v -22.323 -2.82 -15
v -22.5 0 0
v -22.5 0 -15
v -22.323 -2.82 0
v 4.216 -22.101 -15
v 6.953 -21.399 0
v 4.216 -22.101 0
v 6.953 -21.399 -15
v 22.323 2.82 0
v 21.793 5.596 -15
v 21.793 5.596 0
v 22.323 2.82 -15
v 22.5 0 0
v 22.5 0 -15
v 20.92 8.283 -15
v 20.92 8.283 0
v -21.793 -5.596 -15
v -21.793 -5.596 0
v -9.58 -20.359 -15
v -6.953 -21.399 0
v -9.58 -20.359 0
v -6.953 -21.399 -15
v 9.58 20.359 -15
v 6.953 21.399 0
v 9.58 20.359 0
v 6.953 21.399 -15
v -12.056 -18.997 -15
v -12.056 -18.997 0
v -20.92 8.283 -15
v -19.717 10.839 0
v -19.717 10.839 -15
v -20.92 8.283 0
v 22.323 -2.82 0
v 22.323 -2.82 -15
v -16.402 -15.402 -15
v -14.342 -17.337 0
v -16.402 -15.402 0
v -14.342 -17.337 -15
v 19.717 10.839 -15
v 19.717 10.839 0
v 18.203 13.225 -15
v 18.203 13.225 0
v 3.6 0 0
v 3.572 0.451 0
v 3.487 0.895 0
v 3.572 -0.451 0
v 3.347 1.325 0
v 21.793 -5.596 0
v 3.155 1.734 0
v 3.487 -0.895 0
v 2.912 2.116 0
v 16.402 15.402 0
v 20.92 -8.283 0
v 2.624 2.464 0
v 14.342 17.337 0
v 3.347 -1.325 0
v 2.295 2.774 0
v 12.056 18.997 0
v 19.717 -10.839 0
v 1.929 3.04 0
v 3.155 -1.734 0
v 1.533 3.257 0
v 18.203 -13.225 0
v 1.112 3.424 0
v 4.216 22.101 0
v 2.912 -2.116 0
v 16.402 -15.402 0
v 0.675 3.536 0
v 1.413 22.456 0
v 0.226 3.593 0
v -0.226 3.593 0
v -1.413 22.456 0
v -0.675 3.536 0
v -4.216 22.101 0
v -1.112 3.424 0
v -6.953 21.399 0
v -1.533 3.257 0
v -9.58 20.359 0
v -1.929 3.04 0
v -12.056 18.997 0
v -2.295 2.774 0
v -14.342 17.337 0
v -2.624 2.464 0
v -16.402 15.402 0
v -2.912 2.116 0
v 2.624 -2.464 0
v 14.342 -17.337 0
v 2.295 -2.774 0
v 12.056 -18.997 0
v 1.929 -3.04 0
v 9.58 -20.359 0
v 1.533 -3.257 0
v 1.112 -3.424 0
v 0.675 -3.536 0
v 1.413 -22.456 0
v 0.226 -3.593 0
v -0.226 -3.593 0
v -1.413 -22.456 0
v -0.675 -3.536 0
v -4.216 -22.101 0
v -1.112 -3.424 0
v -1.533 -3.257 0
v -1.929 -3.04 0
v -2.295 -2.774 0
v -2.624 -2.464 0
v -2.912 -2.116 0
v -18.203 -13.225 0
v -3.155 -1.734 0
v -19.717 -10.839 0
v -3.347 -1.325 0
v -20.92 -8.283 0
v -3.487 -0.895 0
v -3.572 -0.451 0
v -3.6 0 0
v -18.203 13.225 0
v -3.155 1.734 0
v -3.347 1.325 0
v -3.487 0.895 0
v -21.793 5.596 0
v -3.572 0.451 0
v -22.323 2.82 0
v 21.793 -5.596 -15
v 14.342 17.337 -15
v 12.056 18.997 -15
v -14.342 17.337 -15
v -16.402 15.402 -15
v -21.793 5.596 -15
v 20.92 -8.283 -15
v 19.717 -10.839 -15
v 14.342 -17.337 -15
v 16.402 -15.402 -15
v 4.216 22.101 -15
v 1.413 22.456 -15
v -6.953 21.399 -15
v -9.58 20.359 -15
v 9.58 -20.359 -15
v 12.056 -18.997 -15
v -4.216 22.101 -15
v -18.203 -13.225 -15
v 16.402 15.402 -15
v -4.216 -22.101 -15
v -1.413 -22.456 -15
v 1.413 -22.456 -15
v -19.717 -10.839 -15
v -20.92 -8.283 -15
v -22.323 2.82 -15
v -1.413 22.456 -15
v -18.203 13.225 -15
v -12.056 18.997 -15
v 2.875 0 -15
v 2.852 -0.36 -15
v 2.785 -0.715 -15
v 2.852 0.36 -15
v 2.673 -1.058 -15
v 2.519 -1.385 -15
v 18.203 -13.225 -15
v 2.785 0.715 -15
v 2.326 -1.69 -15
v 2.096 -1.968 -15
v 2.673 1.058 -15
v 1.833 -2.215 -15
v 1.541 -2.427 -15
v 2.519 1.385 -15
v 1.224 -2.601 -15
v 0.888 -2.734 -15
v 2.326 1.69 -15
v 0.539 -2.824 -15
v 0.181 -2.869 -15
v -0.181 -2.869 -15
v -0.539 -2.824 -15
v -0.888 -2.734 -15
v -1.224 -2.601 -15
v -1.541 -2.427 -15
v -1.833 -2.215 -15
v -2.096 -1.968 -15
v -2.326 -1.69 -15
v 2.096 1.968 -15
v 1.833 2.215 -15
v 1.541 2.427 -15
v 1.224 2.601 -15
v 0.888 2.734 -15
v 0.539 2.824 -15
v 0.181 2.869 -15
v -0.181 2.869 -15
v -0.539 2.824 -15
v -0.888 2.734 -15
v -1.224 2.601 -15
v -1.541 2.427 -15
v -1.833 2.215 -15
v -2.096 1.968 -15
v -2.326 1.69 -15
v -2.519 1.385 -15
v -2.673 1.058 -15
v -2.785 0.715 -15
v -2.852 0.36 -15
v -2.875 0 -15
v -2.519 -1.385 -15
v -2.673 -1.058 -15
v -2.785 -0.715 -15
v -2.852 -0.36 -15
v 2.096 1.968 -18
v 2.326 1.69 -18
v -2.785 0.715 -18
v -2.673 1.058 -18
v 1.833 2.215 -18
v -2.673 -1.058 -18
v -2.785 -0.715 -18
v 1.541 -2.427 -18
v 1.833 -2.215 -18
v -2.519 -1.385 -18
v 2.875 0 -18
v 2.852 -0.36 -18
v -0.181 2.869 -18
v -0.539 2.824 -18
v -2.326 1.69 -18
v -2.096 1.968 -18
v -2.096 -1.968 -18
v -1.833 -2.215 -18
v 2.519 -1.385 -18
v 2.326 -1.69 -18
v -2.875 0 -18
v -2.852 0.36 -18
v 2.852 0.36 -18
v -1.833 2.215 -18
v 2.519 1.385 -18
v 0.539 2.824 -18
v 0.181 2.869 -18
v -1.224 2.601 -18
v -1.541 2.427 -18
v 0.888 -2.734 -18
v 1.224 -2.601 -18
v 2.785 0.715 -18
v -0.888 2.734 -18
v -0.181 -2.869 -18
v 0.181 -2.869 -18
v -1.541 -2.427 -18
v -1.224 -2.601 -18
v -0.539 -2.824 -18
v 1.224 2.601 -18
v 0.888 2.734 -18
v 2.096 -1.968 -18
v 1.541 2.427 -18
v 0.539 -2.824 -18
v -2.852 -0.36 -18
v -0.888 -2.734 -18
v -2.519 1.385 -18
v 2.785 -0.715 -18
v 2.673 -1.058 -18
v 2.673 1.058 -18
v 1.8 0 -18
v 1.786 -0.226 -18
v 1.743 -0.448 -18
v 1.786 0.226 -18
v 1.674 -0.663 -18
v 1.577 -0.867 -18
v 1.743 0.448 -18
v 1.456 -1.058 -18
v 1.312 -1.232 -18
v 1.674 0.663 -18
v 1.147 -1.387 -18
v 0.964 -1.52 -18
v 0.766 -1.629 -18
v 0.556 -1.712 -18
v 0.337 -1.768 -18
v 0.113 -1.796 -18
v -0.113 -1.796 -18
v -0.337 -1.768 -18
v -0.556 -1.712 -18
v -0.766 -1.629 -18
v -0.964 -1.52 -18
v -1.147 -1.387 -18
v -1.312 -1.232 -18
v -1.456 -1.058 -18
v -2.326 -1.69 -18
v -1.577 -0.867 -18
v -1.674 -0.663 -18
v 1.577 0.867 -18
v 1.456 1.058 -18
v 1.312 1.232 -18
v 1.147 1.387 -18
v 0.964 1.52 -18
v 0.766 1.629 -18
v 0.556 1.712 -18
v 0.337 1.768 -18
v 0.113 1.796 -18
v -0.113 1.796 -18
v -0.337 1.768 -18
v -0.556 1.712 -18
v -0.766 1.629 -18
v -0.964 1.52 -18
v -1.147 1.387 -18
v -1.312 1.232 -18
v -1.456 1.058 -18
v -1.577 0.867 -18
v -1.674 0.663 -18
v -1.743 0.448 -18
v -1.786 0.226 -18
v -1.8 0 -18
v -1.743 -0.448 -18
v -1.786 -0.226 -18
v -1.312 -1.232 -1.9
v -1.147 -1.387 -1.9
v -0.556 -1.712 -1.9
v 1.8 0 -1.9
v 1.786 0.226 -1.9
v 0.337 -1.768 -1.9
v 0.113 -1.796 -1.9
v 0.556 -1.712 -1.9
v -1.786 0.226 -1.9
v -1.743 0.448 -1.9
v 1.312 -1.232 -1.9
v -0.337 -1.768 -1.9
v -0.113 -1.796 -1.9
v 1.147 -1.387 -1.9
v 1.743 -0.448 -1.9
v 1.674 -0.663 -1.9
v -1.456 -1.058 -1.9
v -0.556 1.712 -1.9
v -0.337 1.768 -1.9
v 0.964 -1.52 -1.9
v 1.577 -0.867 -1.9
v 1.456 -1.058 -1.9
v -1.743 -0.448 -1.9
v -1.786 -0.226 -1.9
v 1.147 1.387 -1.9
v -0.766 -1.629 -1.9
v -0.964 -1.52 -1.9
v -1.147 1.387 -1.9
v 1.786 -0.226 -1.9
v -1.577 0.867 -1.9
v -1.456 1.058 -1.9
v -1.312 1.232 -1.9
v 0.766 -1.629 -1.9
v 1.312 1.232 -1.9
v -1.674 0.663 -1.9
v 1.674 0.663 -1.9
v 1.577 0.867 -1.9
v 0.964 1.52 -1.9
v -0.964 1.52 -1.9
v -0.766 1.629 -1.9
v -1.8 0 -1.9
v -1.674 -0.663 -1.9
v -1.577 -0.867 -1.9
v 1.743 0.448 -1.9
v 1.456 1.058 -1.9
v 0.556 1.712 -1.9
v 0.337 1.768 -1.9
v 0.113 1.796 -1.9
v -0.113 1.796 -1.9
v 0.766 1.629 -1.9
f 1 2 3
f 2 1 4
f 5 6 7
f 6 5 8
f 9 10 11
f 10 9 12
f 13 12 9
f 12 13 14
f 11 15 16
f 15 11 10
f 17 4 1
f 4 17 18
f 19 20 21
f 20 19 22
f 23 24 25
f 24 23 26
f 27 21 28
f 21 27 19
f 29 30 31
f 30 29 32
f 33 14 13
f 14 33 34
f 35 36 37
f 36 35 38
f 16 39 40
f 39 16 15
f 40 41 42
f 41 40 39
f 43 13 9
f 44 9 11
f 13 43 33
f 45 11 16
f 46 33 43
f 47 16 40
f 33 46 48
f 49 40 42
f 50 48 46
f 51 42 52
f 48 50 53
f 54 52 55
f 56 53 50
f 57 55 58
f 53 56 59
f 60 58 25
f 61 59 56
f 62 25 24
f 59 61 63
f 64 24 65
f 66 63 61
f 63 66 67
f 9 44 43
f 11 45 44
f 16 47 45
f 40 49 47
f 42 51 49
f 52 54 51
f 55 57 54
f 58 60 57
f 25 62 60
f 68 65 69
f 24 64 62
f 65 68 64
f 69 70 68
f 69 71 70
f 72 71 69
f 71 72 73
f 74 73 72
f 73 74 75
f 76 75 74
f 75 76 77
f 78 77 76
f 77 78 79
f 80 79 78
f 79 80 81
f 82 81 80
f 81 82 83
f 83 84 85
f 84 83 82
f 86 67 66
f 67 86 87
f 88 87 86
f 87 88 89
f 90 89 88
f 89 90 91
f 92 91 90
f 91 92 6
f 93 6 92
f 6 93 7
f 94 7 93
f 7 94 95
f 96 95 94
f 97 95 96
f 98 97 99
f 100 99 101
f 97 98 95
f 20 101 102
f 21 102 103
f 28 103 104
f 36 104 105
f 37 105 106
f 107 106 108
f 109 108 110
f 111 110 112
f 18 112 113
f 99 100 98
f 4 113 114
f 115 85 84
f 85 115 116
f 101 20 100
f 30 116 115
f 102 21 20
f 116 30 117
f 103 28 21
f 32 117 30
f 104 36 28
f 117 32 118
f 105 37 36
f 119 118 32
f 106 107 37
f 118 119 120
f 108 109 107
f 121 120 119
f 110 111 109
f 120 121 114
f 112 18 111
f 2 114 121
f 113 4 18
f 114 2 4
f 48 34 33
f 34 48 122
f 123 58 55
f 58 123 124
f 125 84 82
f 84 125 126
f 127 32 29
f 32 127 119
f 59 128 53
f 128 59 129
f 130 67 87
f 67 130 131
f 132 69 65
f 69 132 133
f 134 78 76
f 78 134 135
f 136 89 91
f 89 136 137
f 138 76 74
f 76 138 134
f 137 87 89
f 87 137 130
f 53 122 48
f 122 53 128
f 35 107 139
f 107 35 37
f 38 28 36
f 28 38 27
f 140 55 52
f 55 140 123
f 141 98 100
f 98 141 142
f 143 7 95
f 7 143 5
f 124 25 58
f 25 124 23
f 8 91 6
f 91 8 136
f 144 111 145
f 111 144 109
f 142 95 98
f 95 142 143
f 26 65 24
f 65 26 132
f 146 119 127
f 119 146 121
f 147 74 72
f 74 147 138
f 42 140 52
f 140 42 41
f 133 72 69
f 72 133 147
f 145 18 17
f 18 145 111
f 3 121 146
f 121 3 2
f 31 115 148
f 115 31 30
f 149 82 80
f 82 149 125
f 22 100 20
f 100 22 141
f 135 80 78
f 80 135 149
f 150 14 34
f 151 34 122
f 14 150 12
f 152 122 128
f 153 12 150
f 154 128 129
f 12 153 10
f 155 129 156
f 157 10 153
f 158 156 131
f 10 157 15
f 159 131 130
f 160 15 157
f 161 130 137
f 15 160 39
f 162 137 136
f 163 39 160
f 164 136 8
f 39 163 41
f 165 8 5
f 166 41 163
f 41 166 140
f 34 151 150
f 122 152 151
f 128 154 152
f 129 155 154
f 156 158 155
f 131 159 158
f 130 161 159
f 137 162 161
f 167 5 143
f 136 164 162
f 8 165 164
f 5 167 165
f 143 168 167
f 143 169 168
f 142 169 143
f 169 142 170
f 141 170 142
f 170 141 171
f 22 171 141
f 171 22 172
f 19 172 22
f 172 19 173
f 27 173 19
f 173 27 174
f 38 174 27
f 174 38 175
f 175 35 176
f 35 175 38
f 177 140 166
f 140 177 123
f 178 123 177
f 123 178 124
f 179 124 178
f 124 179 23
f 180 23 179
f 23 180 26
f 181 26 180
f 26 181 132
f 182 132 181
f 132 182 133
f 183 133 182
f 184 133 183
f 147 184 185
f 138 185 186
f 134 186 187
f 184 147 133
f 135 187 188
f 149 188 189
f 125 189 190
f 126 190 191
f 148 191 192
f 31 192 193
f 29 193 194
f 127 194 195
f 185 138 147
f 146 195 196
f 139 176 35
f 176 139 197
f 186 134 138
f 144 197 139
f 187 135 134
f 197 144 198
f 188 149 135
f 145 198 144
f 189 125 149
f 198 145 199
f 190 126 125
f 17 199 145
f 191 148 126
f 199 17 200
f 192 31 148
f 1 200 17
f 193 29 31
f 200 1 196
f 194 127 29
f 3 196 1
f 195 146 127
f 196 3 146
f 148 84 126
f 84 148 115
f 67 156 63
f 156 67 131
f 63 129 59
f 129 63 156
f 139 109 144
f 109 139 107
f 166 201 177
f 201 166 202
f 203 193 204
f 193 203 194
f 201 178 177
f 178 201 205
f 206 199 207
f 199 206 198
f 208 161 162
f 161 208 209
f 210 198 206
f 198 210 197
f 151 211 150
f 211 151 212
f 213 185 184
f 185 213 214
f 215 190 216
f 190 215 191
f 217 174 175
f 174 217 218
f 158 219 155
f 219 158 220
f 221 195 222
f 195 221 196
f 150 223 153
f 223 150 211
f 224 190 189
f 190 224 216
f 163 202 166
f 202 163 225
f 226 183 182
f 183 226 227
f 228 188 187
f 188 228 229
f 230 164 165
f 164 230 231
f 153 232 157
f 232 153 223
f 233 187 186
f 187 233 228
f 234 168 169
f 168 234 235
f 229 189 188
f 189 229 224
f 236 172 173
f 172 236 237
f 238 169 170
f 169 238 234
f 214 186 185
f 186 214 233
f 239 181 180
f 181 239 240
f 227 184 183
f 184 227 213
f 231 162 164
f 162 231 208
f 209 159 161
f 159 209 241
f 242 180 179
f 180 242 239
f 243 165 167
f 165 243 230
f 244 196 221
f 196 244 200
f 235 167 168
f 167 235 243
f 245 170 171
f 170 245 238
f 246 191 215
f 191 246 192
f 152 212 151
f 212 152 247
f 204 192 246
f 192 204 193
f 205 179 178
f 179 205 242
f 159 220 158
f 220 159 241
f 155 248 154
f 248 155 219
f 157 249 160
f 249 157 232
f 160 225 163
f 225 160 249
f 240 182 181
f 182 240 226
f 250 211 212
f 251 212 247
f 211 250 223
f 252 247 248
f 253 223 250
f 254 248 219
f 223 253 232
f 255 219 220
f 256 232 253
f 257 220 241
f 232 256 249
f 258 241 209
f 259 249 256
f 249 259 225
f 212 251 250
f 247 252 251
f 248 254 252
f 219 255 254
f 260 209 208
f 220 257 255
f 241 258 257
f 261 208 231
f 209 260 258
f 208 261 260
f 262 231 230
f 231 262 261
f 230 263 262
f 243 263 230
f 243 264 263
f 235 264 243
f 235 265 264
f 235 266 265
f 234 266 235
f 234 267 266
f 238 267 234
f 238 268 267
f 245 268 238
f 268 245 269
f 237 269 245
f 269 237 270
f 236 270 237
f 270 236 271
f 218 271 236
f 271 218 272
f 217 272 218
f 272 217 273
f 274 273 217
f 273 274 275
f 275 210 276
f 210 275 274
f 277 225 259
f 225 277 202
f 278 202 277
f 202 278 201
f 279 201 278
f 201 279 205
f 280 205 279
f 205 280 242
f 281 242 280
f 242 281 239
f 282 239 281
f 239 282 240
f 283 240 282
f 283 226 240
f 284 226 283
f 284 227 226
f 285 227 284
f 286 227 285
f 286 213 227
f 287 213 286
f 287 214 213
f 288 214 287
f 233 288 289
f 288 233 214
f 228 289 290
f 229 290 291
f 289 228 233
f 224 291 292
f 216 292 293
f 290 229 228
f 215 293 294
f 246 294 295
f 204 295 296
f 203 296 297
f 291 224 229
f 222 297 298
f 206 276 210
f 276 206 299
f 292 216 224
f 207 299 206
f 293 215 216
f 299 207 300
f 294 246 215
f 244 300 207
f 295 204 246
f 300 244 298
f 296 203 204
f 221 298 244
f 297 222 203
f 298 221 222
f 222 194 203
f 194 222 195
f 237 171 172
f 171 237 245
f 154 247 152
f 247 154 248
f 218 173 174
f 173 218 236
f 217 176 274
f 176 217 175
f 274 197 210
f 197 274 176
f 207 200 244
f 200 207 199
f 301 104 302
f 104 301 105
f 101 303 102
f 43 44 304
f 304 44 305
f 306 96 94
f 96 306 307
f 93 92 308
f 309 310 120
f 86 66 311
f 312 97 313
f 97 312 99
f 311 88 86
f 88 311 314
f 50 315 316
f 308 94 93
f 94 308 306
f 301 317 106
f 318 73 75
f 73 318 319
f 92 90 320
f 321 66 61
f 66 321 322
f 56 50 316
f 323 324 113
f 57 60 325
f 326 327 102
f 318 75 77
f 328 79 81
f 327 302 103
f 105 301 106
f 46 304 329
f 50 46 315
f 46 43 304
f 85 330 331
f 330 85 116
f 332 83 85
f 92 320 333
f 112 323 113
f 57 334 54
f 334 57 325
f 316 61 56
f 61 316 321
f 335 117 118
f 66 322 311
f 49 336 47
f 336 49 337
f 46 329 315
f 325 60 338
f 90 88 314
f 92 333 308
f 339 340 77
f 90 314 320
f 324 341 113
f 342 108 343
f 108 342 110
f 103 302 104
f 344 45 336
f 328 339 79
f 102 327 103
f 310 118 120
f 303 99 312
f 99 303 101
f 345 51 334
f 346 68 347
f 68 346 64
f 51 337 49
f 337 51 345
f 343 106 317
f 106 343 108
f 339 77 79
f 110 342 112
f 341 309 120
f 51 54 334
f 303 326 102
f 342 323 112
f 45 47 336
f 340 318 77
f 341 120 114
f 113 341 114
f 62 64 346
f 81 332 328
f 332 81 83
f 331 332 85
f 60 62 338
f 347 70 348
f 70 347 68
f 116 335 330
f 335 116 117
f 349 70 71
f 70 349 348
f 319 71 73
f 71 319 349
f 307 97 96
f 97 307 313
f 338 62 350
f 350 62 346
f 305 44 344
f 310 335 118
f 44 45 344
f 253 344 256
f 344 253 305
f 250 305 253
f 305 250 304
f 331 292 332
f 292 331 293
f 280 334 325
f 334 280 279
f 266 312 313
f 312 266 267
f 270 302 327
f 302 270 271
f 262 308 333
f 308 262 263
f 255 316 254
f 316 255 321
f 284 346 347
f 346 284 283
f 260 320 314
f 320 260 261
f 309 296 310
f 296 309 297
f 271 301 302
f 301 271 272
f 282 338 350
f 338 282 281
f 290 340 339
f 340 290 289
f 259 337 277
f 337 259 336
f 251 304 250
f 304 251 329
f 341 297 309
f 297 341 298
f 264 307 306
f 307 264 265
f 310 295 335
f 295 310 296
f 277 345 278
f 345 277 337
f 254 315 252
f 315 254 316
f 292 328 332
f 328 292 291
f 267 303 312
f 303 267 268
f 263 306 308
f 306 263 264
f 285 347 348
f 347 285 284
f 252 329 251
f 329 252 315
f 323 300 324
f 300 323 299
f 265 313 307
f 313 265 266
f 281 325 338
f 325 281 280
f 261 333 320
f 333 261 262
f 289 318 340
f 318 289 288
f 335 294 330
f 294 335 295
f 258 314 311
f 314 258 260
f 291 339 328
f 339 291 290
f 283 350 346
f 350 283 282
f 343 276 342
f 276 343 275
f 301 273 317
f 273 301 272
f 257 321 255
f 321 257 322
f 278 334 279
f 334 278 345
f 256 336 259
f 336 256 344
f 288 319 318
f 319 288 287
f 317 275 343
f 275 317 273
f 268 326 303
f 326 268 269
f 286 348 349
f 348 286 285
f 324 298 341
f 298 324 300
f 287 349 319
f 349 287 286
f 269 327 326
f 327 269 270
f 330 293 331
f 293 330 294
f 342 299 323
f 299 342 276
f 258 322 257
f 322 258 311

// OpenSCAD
$fn = 50;

difference() {
	union() {
		translate(v = [0, 0, -15.0]) {
			cylinder(h = 15, r = 22.5);
		}
		#translate(v = [0, 0, -18.0]) {
			cylinder(h = 18, r = 2.875);
		}
	}
	union() {
		translate(v = [0, 0, 0]) {
			rotate(a = [0, 0, 0]) {
				difference() {
					union() {
						translate(v = [0, 0, -18.0]) {
							cylinder(h = 18, r = 1.5);
						}
						translate(v = [0, 0, -1.9]) {
							cylinder(h = 1.9, r1 = 1.8, r2 = 3.6);
						}
						translate(v = [0, 0, -18.0]) {
							cylinder(h = 18, r = 1.8);
						}
						translate(v = [0, 0, -18.0]) {
							cylinder(h = 18, r = 1.5);
						}
					}
					union();
				}
			}
		}
	}
}
